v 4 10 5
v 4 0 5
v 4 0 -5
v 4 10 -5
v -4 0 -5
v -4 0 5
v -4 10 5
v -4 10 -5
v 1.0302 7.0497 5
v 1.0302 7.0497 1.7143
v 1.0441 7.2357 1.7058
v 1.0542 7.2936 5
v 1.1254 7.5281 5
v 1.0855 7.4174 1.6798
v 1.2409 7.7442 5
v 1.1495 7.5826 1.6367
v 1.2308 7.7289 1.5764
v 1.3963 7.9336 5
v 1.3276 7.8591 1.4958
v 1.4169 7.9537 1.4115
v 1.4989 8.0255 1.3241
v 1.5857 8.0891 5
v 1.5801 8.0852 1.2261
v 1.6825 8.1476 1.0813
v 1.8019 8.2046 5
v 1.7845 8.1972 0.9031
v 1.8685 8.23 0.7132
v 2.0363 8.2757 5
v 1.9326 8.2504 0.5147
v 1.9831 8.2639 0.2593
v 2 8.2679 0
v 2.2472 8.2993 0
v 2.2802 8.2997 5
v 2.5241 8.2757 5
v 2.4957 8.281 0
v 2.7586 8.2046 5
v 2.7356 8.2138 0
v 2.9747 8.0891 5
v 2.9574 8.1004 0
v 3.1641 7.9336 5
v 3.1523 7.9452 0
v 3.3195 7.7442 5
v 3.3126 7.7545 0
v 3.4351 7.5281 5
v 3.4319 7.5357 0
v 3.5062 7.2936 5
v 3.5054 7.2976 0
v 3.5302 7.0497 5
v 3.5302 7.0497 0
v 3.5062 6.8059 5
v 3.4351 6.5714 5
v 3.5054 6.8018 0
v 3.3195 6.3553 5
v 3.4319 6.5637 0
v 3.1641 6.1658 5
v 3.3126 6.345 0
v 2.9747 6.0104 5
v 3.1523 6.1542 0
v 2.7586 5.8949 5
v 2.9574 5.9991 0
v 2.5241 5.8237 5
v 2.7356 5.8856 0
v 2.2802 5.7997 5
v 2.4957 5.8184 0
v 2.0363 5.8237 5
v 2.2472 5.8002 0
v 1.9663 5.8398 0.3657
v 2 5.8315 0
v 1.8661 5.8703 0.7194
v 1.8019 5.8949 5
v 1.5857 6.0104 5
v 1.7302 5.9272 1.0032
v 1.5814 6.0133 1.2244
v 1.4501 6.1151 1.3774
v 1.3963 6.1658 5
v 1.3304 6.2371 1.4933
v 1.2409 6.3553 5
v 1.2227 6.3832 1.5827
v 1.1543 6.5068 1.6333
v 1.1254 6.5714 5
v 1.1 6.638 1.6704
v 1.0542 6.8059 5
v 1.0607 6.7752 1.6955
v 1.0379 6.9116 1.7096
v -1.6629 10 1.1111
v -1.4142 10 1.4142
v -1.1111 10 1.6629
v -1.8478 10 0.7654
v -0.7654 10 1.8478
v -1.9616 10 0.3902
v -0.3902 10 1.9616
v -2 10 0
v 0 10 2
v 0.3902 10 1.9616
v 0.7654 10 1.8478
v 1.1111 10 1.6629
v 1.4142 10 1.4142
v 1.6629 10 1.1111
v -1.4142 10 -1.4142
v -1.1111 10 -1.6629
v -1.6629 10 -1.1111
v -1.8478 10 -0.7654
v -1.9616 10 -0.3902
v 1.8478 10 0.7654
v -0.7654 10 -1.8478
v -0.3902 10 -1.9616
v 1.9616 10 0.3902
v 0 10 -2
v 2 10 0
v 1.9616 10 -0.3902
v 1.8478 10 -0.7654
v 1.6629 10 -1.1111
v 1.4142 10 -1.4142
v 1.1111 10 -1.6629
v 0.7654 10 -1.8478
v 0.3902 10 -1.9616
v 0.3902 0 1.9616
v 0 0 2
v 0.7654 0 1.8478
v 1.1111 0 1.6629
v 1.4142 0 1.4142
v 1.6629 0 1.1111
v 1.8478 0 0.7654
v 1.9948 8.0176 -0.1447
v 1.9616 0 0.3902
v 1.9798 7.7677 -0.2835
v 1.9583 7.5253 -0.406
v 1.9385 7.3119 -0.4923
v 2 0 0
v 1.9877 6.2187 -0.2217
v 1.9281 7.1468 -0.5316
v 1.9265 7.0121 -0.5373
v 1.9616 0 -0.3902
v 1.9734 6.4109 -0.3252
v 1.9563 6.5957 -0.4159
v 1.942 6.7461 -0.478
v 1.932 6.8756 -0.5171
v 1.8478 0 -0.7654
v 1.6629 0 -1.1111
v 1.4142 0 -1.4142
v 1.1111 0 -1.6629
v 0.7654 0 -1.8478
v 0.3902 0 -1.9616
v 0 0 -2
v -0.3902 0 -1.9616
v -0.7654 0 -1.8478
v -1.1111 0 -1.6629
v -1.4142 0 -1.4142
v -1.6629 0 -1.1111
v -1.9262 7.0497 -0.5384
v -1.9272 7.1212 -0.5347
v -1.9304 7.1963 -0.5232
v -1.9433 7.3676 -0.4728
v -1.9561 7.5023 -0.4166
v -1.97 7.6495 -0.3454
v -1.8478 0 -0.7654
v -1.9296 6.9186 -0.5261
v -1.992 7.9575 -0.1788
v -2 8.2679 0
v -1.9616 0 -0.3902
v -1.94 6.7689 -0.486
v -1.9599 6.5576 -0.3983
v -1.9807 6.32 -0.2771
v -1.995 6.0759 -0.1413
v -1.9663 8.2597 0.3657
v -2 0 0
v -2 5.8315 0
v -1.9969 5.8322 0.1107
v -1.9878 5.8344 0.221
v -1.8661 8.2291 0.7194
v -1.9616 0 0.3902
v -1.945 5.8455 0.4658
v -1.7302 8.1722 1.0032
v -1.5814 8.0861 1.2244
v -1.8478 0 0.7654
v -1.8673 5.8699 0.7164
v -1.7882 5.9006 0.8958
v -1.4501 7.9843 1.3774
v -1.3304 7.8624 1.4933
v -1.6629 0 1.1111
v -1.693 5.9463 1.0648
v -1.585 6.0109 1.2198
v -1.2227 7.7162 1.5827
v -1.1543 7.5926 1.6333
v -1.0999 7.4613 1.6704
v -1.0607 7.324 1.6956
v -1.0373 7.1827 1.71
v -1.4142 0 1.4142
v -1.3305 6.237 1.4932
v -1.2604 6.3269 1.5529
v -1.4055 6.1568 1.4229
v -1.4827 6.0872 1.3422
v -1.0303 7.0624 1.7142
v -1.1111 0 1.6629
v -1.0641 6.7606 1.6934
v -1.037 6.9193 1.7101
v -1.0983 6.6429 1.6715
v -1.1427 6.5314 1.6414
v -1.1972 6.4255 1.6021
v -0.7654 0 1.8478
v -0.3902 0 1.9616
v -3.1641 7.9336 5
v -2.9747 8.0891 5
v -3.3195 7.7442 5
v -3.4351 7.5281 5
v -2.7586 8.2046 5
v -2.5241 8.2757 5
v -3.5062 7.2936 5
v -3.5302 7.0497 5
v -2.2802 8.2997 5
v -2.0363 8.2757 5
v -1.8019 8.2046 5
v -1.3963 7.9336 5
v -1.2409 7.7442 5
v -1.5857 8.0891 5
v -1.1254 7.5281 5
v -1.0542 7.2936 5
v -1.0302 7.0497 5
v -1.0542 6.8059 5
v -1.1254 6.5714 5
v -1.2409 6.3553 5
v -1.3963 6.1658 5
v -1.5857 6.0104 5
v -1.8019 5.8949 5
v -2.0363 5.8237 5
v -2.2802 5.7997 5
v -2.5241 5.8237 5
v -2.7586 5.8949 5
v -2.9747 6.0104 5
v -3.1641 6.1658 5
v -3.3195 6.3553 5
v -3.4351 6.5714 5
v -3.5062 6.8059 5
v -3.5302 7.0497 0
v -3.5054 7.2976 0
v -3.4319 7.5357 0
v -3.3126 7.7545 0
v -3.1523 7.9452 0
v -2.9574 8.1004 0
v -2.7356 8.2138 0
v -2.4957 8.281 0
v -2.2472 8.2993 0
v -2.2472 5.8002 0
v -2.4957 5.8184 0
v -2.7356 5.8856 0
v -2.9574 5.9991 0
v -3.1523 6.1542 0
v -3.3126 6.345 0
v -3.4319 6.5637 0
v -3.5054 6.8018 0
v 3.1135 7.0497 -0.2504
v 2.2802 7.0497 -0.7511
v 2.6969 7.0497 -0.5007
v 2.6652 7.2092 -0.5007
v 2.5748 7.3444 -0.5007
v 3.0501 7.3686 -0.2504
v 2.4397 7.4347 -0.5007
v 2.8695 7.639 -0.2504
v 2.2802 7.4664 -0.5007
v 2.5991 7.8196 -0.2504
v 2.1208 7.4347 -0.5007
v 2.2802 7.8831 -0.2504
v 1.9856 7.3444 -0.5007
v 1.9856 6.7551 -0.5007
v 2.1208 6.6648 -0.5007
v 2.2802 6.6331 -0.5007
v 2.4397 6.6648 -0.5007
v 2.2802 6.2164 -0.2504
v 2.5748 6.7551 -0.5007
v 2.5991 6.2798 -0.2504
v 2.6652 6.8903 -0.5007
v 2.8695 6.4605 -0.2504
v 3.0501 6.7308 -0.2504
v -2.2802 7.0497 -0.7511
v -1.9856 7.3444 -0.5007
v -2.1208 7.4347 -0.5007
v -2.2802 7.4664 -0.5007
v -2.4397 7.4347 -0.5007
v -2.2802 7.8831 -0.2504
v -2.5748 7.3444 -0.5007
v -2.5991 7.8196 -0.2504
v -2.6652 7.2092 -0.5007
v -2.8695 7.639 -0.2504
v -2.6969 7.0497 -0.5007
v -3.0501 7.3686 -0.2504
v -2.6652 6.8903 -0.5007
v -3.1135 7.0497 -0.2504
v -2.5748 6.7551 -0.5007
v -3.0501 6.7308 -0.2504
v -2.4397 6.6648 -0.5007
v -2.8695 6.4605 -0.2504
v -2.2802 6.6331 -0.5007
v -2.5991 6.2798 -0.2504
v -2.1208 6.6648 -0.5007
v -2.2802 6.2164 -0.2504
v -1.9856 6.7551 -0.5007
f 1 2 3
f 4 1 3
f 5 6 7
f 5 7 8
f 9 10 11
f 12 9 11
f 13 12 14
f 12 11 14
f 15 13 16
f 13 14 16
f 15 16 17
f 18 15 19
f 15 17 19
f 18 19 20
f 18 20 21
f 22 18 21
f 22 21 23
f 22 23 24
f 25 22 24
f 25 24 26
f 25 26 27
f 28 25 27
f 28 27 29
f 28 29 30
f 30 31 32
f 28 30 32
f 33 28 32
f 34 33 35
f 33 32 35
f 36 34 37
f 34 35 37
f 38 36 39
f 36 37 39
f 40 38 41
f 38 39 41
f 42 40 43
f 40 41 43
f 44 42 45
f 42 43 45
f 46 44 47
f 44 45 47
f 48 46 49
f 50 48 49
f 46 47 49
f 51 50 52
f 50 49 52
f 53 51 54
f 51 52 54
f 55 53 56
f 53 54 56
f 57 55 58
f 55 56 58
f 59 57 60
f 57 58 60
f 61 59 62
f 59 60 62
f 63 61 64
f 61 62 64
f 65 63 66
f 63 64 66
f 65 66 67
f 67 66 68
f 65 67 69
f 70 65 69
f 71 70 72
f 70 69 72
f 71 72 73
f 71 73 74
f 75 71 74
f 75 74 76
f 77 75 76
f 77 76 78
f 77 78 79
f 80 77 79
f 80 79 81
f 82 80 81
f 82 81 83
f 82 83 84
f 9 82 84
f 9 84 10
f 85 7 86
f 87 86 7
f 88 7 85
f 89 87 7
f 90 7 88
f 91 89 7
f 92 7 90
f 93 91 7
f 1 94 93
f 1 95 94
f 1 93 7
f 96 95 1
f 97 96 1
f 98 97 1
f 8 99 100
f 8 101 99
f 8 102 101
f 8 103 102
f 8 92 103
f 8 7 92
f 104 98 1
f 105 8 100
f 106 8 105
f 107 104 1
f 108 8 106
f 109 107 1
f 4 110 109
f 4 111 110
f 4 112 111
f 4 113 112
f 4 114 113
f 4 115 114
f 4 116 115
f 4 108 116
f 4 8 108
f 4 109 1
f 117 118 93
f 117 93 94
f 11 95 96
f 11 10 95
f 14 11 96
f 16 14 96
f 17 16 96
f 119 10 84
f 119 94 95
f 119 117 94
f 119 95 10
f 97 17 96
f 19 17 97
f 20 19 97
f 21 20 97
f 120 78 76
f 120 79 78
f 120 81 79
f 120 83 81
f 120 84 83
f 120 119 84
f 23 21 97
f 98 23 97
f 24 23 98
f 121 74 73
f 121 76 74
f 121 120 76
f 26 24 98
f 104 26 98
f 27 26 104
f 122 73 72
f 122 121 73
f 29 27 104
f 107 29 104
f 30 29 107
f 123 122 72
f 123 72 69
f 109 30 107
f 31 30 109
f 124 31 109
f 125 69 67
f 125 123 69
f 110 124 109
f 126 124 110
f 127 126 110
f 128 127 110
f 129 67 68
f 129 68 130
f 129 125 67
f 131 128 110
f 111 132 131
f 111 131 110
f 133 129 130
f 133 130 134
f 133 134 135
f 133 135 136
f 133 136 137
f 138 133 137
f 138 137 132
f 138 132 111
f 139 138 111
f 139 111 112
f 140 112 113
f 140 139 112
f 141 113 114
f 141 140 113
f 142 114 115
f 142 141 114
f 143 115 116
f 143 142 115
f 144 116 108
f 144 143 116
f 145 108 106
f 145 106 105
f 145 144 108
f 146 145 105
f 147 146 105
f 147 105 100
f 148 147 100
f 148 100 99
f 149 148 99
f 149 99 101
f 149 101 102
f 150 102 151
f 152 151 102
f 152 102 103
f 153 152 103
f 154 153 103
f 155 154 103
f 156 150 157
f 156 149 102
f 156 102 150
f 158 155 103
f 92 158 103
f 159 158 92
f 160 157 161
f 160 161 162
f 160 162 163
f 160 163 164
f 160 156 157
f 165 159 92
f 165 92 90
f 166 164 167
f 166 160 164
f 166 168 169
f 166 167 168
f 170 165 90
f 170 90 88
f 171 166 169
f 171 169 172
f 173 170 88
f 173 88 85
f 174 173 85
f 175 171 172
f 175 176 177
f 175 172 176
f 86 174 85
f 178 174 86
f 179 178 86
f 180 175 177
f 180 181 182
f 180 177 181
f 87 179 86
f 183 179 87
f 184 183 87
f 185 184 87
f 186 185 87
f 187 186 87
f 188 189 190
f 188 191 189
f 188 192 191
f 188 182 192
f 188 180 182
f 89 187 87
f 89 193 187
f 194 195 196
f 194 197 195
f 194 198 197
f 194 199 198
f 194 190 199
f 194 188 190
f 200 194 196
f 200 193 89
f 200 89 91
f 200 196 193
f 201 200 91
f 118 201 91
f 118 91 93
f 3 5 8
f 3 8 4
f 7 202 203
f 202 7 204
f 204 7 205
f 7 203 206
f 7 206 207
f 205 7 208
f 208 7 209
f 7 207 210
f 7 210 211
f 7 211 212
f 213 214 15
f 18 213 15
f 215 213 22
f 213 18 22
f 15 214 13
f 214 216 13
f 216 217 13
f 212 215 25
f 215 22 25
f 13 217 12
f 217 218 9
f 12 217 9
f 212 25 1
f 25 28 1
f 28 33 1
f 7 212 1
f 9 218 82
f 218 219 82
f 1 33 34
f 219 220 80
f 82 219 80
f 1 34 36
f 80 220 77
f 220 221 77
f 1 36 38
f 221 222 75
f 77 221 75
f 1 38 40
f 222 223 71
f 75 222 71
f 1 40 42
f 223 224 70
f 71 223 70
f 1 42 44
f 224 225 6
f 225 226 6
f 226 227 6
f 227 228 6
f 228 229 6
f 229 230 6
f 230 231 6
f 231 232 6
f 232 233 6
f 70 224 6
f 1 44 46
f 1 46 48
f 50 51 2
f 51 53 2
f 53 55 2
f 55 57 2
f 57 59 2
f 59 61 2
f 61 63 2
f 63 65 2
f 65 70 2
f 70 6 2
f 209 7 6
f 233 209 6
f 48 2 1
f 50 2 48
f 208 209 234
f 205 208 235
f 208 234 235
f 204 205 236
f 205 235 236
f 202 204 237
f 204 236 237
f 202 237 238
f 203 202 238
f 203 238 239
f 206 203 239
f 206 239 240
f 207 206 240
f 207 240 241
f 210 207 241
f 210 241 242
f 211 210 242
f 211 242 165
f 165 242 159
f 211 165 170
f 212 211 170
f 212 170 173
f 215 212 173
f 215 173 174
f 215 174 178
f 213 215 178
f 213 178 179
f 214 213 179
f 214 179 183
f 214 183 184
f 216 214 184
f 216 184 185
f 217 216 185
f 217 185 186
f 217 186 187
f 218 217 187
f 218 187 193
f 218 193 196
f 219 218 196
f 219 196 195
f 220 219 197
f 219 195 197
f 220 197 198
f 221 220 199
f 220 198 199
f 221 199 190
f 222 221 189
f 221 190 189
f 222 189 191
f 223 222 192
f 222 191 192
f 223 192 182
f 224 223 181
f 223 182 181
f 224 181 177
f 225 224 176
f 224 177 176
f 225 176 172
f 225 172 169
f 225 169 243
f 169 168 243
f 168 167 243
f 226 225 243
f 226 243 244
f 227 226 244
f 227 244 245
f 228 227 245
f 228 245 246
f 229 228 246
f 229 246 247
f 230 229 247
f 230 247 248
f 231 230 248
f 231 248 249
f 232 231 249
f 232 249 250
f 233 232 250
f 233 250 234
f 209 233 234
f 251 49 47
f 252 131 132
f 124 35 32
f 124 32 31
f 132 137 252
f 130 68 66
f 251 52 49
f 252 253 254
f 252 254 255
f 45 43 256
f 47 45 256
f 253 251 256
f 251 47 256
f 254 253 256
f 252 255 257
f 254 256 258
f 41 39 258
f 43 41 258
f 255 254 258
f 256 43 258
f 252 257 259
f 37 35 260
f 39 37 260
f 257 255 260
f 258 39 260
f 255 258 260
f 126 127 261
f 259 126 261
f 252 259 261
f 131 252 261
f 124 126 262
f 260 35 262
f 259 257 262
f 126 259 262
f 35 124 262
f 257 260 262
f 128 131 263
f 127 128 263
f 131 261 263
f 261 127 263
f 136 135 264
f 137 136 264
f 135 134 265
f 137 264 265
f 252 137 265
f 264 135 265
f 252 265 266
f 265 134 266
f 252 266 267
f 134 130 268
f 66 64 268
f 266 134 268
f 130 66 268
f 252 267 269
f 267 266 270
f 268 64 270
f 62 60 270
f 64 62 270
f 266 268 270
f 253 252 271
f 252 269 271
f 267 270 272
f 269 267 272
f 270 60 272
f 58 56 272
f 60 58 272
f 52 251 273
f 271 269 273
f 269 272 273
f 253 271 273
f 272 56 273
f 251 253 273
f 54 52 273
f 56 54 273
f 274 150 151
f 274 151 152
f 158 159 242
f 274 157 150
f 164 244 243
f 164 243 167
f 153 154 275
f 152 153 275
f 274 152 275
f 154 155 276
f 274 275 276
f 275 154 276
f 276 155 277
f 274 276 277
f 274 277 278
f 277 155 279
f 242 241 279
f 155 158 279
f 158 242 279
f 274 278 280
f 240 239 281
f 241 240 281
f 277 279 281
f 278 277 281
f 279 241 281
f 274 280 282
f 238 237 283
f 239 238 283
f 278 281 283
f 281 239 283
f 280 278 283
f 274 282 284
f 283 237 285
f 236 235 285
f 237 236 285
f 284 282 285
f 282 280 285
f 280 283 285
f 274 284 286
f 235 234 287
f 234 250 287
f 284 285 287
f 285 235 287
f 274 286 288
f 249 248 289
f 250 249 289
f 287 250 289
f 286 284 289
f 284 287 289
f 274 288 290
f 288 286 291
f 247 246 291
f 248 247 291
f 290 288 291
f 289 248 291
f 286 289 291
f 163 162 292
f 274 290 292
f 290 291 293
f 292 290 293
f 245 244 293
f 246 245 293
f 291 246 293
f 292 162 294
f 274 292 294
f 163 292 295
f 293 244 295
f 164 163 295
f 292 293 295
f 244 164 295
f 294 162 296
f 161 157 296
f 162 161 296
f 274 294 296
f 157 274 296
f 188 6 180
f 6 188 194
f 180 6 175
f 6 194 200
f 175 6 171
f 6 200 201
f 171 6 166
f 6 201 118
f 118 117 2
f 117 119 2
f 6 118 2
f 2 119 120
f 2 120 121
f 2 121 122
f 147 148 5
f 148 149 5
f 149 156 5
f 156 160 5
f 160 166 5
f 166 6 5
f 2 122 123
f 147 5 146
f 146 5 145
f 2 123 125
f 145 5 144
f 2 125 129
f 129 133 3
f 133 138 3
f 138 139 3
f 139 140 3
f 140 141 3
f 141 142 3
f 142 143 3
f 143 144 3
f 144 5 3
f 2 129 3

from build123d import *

# Parameters (mm, degrees)
ESQUISSE1_W           = 8
ESQUISSE1_H           = 10
ESQUISSE1_R           = 2
BOSS_EXTRU_1_DEPTH    = 10
TROU_TARAUD_M31_D     = 2.5
TROU_TARAUD_M31_DEPTH = 5
TROU_TARAUD_M31_TIP   = 0.751075774


with BuildPart() as part:
    # Esquisse1 → Boss.-Extru.1 (new body)
    with BuildSketch(Plane(origin=(0, 0, 0), x_dir=(1, 0, 0), z_dir=(0, 1, 0))):
        Rectangle(ESQUISSE1_W, ESQUISSE1_H)
        with Locations(Location((0, 0, 0), (0, 0, 270))):
            Circle(ESQUISSE1_R, mode=Mode.SUBTRACT)
    extrude(amount=BOSS_EXTRU_1_DEPTH)

    # Trou taraudé M31
    with Locations(Plane.XY.offset(5)):
        with Locations((-2.280208153, 7.049723064), (2.280208153, 7.049723064)):
            Hole(TROU_TARAUD_M31_D / 2, depth=TROU_TARAUD_M31_DEPTH)
            with Locations((0, 0, -(TROU_TARAUD_M31_DEPTH + TROU_TARAUD_M31_TIP / 2))):  # 118° drill point
                Cone(0, TROU_TARAUD_M31_D / 2, TROU_TARAUD_M31_TIP, mode=Mode.SUBTRACT)


solid = part.part
